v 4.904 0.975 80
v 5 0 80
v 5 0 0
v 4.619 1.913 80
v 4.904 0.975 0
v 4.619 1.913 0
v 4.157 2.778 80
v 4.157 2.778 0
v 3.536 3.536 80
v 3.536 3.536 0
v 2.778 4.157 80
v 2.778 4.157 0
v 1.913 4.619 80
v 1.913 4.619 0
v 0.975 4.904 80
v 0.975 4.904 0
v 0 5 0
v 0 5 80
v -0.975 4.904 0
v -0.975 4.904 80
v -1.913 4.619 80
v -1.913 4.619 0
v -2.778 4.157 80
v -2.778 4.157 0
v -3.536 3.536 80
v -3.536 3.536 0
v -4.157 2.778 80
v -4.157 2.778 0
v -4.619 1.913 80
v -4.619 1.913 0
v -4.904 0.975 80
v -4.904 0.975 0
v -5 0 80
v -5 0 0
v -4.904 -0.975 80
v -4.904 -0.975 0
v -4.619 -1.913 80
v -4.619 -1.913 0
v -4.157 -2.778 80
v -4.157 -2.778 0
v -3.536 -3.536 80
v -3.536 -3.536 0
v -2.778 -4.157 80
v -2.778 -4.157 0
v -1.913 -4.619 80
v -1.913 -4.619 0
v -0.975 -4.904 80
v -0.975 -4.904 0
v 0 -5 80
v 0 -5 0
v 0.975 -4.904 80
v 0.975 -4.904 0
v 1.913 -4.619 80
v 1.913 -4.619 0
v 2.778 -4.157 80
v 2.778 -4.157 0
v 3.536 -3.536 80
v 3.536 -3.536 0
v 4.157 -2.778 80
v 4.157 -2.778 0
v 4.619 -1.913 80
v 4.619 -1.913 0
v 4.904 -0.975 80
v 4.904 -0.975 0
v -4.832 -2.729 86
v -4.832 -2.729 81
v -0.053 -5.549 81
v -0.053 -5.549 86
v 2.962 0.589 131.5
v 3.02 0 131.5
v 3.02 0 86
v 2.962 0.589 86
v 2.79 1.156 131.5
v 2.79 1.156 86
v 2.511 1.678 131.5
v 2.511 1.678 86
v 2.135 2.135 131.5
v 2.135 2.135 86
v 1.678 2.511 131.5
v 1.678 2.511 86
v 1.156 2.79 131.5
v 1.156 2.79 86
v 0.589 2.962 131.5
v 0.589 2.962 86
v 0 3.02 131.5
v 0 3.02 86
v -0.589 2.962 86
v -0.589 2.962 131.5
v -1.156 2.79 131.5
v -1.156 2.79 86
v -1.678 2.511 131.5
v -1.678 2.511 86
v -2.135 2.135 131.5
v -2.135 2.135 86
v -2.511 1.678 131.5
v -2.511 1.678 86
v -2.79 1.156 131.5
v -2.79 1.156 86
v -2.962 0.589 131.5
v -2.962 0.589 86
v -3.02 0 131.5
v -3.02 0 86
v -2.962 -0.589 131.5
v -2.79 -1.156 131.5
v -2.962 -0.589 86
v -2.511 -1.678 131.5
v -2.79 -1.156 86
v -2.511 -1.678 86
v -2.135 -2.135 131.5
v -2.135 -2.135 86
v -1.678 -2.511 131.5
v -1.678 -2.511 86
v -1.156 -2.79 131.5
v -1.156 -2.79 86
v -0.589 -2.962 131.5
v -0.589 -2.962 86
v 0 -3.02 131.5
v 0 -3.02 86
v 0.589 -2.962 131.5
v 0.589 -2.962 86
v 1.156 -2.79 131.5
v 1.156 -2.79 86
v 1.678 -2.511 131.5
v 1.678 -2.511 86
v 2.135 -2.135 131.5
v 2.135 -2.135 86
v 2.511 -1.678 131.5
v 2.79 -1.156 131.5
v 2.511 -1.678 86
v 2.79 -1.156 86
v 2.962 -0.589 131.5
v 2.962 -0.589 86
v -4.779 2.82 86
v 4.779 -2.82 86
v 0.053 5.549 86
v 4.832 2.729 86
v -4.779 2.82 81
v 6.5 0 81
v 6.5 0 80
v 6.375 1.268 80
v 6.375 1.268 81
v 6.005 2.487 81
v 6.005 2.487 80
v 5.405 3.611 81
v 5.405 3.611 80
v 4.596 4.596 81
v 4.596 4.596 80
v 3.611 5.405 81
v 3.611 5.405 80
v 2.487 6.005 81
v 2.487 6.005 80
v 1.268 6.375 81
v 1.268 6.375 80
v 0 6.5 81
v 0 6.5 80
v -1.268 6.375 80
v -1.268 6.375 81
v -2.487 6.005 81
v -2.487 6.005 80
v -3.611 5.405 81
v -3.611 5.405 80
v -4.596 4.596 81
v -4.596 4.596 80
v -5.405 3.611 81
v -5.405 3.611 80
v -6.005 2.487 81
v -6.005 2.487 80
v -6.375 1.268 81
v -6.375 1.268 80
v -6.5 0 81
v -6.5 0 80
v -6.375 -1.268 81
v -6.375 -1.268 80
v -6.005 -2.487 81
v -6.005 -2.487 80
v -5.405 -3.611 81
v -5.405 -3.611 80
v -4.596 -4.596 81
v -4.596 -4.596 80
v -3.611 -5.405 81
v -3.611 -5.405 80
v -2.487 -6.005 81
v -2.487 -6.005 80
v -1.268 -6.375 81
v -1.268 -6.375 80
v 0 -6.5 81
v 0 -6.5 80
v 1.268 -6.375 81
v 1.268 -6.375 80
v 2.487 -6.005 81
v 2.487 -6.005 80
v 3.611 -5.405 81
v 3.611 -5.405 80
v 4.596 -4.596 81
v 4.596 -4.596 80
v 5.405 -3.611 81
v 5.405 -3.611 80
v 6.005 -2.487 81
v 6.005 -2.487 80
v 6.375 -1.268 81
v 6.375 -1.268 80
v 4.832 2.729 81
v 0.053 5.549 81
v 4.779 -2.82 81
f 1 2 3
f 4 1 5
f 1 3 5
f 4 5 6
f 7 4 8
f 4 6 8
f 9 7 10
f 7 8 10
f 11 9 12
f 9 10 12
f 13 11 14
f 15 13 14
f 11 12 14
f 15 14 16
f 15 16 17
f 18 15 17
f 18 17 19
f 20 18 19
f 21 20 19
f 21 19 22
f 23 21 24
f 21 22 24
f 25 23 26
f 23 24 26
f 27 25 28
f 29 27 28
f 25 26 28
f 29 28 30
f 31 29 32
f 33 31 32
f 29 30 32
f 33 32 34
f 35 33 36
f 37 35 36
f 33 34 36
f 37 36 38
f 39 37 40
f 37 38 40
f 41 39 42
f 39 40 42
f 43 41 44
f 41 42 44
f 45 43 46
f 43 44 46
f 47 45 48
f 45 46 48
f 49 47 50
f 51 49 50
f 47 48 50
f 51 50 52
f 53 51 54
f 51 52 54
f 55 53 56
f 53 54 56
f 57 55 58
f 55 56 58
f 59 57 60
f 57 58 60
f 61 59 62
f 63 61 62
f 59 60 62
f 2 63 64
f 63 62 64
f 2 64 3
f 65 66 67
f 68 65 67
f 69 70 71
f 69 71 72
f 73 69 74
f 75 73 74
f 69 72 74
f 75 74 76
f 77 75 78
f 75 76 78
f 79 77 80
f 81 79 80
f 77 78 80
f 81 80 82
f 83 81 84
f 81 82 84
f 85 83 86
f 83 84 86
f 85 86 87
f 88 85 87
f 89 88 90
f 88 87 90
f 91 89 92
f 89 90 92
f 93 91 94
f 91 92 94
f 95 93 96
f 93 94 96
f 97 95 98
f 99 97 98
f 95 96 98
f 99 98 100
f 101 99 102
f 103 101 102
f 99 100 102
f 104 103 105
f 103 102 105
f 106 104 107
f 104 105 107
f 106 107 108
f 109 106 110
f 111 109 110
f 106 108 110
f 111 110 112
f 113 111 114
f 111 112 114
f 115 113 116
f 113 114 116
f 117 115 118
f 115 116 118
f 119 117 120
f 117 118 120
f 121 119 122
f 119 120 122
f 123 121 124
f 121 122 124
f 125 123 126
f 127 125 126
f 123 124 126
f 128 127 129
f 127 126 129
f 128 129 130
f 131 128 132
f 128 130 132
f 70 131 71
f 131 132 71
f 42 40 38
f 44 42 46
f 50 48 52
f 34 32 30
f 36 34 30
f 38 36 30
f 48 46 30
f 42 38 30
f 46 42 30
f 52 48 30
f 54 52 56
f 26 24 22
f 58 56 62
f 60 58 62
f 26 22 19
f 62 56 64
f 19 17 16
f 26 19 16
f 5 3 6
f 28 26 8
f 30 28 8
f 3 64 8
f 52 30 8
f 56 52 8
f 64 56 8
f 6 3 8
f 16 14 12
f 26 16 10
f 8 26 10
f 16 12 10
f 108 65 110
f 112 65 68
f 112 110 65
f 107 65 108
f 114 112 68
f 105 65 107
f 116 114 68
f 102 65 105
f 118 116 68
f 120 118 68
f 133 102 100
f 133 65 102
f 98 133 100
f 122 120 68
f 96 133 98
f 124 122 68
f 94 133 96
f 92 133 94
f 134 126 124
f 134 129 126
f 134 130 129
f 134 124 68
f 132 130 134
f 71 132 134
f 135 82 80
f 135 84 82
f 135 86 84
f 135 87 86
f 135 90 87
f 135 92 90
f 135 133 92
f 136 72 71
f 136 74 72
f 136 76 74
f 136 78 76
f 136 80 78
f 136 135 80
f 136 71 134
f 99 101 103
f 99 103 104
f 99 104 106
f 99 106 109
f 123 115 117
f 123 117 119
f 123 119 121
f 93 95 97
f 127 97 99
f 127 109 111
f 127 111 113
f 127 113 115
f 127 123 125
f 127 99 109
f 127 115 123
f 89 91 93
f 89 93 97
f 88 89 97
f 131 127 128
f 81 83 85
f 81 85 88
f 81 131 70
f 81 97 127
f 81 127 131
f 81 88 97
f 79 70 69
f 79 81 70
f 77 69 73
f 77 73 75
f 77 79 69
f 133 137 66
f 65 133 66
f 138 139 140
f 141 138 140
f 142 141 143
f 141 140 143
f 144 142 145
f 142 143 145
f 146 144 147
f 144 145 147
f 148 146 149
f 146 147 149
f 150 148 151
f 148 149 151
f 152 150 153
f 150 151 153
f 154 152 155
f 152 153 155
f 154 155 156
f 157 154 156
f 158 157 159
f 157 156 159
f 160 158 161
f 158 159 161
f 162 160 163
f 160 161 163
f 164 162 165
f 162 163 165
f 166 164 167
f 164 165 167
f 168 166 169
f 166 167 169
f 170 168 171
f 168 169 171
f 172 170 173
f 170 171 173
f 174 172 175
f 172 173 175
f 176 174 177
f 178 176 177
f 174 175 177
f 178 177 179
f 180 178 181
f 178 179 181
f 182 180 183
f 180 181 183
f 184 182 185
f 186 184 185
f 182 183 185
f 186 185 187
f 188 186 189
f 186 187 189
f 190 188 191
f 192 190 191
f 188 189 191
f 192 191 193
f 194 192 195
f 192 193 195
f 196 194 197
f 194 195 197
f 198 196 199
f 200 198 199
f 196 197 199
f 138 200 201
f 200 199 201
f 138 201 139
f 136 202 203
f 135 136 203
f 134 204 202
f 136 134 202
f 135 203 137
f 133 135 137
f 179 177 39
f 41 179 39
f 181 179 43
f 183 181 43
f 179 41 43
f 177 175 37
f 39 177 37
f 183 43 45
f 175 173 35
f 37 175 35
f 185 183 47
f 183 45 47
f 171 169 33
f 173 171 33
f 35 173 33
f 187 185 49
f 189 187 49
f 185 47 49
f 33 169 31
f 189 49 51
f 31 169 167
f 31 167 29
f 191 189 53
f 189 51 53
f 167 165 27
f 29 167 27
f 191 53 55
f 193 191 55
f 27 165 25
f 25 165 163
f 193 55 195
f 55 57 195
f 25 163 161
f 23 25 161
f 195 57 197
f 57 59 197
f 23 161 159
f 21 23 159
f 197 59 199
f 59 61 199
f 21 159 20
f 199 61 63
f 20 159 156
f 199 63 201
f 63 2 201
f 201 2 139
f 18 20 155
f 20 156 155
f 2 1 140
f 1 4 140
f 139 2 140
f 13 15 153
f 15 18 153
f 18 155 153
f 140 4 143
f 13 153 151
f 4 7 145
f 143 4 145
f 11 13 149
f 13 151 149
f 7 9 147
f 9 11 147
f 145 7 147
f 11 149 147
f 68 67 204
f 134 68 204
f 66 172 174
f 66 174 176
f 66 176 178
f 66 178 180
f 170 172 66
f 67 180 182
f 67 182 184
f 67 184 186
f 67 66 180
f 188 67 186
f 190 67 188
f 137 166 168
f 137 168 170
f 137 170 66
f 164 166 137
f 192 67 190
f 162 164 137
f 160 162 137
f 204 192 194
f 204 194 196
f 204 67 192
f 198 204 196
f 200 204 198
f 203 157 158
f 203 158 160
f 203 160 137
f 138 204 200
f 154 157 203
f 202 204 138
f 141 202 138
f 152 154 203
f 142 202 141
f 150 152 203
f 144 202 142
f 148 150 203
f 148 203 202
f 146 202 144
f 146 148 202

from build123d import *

# Parameters (mm, degrees)
SKETCH1_R           = 5
BOSS_EXTRUDE1_DEPTH = 80
SKETCH2_R           = 6.5
BOSS_EXTRUDE2_DEPTH = 1
BOSS_EXTRUDE5_DEPTH = 5
SKETCH6_R           = 3.019653564
BOSS_EXTRUDE6_DEPTH = 45.5


with BuildPart() as part:
    # Sketch1 → Boss-Extrude1 (new body)
    with BuildSketch(Plane.XY):
        Circle(SKETCH1_R)
    extrude(amount=BOSS_EXTRUDE1_DEPTH)

    # Sketch2 → Boss-Extrude2 (add)
    with BuildSketch(Plane.XY.offset(80)):
        Circle(SKETCH2_R)
    extrude(amount=BOSS_EXTRUDE2_DEPTH)

    # Sketch5 → Boss-Extrude5 (add)
    with BuildSketch(Plane.XY.offset(81)):
        Polygon((4.778851136, -2.820156932), (4.831753114, 2.728528019), (0.052901978, 5.548684951), (-4.778851136, 2.820156932), (-4.831753114, -2.728528019), (-0.052901978, -5.548684951), align=None)
    extrude(amount=BOSS_EXTRUDE5_DEPTH)

    # Sketch6 → Boss-Extrude6 (add)
    with BuildSketch(Plane.XY.offset(86)):
        Circle(SKETCH6_R)
    extrude(amount=BOSS_EXTRUDE6_DEPTH)


solid = part.part
